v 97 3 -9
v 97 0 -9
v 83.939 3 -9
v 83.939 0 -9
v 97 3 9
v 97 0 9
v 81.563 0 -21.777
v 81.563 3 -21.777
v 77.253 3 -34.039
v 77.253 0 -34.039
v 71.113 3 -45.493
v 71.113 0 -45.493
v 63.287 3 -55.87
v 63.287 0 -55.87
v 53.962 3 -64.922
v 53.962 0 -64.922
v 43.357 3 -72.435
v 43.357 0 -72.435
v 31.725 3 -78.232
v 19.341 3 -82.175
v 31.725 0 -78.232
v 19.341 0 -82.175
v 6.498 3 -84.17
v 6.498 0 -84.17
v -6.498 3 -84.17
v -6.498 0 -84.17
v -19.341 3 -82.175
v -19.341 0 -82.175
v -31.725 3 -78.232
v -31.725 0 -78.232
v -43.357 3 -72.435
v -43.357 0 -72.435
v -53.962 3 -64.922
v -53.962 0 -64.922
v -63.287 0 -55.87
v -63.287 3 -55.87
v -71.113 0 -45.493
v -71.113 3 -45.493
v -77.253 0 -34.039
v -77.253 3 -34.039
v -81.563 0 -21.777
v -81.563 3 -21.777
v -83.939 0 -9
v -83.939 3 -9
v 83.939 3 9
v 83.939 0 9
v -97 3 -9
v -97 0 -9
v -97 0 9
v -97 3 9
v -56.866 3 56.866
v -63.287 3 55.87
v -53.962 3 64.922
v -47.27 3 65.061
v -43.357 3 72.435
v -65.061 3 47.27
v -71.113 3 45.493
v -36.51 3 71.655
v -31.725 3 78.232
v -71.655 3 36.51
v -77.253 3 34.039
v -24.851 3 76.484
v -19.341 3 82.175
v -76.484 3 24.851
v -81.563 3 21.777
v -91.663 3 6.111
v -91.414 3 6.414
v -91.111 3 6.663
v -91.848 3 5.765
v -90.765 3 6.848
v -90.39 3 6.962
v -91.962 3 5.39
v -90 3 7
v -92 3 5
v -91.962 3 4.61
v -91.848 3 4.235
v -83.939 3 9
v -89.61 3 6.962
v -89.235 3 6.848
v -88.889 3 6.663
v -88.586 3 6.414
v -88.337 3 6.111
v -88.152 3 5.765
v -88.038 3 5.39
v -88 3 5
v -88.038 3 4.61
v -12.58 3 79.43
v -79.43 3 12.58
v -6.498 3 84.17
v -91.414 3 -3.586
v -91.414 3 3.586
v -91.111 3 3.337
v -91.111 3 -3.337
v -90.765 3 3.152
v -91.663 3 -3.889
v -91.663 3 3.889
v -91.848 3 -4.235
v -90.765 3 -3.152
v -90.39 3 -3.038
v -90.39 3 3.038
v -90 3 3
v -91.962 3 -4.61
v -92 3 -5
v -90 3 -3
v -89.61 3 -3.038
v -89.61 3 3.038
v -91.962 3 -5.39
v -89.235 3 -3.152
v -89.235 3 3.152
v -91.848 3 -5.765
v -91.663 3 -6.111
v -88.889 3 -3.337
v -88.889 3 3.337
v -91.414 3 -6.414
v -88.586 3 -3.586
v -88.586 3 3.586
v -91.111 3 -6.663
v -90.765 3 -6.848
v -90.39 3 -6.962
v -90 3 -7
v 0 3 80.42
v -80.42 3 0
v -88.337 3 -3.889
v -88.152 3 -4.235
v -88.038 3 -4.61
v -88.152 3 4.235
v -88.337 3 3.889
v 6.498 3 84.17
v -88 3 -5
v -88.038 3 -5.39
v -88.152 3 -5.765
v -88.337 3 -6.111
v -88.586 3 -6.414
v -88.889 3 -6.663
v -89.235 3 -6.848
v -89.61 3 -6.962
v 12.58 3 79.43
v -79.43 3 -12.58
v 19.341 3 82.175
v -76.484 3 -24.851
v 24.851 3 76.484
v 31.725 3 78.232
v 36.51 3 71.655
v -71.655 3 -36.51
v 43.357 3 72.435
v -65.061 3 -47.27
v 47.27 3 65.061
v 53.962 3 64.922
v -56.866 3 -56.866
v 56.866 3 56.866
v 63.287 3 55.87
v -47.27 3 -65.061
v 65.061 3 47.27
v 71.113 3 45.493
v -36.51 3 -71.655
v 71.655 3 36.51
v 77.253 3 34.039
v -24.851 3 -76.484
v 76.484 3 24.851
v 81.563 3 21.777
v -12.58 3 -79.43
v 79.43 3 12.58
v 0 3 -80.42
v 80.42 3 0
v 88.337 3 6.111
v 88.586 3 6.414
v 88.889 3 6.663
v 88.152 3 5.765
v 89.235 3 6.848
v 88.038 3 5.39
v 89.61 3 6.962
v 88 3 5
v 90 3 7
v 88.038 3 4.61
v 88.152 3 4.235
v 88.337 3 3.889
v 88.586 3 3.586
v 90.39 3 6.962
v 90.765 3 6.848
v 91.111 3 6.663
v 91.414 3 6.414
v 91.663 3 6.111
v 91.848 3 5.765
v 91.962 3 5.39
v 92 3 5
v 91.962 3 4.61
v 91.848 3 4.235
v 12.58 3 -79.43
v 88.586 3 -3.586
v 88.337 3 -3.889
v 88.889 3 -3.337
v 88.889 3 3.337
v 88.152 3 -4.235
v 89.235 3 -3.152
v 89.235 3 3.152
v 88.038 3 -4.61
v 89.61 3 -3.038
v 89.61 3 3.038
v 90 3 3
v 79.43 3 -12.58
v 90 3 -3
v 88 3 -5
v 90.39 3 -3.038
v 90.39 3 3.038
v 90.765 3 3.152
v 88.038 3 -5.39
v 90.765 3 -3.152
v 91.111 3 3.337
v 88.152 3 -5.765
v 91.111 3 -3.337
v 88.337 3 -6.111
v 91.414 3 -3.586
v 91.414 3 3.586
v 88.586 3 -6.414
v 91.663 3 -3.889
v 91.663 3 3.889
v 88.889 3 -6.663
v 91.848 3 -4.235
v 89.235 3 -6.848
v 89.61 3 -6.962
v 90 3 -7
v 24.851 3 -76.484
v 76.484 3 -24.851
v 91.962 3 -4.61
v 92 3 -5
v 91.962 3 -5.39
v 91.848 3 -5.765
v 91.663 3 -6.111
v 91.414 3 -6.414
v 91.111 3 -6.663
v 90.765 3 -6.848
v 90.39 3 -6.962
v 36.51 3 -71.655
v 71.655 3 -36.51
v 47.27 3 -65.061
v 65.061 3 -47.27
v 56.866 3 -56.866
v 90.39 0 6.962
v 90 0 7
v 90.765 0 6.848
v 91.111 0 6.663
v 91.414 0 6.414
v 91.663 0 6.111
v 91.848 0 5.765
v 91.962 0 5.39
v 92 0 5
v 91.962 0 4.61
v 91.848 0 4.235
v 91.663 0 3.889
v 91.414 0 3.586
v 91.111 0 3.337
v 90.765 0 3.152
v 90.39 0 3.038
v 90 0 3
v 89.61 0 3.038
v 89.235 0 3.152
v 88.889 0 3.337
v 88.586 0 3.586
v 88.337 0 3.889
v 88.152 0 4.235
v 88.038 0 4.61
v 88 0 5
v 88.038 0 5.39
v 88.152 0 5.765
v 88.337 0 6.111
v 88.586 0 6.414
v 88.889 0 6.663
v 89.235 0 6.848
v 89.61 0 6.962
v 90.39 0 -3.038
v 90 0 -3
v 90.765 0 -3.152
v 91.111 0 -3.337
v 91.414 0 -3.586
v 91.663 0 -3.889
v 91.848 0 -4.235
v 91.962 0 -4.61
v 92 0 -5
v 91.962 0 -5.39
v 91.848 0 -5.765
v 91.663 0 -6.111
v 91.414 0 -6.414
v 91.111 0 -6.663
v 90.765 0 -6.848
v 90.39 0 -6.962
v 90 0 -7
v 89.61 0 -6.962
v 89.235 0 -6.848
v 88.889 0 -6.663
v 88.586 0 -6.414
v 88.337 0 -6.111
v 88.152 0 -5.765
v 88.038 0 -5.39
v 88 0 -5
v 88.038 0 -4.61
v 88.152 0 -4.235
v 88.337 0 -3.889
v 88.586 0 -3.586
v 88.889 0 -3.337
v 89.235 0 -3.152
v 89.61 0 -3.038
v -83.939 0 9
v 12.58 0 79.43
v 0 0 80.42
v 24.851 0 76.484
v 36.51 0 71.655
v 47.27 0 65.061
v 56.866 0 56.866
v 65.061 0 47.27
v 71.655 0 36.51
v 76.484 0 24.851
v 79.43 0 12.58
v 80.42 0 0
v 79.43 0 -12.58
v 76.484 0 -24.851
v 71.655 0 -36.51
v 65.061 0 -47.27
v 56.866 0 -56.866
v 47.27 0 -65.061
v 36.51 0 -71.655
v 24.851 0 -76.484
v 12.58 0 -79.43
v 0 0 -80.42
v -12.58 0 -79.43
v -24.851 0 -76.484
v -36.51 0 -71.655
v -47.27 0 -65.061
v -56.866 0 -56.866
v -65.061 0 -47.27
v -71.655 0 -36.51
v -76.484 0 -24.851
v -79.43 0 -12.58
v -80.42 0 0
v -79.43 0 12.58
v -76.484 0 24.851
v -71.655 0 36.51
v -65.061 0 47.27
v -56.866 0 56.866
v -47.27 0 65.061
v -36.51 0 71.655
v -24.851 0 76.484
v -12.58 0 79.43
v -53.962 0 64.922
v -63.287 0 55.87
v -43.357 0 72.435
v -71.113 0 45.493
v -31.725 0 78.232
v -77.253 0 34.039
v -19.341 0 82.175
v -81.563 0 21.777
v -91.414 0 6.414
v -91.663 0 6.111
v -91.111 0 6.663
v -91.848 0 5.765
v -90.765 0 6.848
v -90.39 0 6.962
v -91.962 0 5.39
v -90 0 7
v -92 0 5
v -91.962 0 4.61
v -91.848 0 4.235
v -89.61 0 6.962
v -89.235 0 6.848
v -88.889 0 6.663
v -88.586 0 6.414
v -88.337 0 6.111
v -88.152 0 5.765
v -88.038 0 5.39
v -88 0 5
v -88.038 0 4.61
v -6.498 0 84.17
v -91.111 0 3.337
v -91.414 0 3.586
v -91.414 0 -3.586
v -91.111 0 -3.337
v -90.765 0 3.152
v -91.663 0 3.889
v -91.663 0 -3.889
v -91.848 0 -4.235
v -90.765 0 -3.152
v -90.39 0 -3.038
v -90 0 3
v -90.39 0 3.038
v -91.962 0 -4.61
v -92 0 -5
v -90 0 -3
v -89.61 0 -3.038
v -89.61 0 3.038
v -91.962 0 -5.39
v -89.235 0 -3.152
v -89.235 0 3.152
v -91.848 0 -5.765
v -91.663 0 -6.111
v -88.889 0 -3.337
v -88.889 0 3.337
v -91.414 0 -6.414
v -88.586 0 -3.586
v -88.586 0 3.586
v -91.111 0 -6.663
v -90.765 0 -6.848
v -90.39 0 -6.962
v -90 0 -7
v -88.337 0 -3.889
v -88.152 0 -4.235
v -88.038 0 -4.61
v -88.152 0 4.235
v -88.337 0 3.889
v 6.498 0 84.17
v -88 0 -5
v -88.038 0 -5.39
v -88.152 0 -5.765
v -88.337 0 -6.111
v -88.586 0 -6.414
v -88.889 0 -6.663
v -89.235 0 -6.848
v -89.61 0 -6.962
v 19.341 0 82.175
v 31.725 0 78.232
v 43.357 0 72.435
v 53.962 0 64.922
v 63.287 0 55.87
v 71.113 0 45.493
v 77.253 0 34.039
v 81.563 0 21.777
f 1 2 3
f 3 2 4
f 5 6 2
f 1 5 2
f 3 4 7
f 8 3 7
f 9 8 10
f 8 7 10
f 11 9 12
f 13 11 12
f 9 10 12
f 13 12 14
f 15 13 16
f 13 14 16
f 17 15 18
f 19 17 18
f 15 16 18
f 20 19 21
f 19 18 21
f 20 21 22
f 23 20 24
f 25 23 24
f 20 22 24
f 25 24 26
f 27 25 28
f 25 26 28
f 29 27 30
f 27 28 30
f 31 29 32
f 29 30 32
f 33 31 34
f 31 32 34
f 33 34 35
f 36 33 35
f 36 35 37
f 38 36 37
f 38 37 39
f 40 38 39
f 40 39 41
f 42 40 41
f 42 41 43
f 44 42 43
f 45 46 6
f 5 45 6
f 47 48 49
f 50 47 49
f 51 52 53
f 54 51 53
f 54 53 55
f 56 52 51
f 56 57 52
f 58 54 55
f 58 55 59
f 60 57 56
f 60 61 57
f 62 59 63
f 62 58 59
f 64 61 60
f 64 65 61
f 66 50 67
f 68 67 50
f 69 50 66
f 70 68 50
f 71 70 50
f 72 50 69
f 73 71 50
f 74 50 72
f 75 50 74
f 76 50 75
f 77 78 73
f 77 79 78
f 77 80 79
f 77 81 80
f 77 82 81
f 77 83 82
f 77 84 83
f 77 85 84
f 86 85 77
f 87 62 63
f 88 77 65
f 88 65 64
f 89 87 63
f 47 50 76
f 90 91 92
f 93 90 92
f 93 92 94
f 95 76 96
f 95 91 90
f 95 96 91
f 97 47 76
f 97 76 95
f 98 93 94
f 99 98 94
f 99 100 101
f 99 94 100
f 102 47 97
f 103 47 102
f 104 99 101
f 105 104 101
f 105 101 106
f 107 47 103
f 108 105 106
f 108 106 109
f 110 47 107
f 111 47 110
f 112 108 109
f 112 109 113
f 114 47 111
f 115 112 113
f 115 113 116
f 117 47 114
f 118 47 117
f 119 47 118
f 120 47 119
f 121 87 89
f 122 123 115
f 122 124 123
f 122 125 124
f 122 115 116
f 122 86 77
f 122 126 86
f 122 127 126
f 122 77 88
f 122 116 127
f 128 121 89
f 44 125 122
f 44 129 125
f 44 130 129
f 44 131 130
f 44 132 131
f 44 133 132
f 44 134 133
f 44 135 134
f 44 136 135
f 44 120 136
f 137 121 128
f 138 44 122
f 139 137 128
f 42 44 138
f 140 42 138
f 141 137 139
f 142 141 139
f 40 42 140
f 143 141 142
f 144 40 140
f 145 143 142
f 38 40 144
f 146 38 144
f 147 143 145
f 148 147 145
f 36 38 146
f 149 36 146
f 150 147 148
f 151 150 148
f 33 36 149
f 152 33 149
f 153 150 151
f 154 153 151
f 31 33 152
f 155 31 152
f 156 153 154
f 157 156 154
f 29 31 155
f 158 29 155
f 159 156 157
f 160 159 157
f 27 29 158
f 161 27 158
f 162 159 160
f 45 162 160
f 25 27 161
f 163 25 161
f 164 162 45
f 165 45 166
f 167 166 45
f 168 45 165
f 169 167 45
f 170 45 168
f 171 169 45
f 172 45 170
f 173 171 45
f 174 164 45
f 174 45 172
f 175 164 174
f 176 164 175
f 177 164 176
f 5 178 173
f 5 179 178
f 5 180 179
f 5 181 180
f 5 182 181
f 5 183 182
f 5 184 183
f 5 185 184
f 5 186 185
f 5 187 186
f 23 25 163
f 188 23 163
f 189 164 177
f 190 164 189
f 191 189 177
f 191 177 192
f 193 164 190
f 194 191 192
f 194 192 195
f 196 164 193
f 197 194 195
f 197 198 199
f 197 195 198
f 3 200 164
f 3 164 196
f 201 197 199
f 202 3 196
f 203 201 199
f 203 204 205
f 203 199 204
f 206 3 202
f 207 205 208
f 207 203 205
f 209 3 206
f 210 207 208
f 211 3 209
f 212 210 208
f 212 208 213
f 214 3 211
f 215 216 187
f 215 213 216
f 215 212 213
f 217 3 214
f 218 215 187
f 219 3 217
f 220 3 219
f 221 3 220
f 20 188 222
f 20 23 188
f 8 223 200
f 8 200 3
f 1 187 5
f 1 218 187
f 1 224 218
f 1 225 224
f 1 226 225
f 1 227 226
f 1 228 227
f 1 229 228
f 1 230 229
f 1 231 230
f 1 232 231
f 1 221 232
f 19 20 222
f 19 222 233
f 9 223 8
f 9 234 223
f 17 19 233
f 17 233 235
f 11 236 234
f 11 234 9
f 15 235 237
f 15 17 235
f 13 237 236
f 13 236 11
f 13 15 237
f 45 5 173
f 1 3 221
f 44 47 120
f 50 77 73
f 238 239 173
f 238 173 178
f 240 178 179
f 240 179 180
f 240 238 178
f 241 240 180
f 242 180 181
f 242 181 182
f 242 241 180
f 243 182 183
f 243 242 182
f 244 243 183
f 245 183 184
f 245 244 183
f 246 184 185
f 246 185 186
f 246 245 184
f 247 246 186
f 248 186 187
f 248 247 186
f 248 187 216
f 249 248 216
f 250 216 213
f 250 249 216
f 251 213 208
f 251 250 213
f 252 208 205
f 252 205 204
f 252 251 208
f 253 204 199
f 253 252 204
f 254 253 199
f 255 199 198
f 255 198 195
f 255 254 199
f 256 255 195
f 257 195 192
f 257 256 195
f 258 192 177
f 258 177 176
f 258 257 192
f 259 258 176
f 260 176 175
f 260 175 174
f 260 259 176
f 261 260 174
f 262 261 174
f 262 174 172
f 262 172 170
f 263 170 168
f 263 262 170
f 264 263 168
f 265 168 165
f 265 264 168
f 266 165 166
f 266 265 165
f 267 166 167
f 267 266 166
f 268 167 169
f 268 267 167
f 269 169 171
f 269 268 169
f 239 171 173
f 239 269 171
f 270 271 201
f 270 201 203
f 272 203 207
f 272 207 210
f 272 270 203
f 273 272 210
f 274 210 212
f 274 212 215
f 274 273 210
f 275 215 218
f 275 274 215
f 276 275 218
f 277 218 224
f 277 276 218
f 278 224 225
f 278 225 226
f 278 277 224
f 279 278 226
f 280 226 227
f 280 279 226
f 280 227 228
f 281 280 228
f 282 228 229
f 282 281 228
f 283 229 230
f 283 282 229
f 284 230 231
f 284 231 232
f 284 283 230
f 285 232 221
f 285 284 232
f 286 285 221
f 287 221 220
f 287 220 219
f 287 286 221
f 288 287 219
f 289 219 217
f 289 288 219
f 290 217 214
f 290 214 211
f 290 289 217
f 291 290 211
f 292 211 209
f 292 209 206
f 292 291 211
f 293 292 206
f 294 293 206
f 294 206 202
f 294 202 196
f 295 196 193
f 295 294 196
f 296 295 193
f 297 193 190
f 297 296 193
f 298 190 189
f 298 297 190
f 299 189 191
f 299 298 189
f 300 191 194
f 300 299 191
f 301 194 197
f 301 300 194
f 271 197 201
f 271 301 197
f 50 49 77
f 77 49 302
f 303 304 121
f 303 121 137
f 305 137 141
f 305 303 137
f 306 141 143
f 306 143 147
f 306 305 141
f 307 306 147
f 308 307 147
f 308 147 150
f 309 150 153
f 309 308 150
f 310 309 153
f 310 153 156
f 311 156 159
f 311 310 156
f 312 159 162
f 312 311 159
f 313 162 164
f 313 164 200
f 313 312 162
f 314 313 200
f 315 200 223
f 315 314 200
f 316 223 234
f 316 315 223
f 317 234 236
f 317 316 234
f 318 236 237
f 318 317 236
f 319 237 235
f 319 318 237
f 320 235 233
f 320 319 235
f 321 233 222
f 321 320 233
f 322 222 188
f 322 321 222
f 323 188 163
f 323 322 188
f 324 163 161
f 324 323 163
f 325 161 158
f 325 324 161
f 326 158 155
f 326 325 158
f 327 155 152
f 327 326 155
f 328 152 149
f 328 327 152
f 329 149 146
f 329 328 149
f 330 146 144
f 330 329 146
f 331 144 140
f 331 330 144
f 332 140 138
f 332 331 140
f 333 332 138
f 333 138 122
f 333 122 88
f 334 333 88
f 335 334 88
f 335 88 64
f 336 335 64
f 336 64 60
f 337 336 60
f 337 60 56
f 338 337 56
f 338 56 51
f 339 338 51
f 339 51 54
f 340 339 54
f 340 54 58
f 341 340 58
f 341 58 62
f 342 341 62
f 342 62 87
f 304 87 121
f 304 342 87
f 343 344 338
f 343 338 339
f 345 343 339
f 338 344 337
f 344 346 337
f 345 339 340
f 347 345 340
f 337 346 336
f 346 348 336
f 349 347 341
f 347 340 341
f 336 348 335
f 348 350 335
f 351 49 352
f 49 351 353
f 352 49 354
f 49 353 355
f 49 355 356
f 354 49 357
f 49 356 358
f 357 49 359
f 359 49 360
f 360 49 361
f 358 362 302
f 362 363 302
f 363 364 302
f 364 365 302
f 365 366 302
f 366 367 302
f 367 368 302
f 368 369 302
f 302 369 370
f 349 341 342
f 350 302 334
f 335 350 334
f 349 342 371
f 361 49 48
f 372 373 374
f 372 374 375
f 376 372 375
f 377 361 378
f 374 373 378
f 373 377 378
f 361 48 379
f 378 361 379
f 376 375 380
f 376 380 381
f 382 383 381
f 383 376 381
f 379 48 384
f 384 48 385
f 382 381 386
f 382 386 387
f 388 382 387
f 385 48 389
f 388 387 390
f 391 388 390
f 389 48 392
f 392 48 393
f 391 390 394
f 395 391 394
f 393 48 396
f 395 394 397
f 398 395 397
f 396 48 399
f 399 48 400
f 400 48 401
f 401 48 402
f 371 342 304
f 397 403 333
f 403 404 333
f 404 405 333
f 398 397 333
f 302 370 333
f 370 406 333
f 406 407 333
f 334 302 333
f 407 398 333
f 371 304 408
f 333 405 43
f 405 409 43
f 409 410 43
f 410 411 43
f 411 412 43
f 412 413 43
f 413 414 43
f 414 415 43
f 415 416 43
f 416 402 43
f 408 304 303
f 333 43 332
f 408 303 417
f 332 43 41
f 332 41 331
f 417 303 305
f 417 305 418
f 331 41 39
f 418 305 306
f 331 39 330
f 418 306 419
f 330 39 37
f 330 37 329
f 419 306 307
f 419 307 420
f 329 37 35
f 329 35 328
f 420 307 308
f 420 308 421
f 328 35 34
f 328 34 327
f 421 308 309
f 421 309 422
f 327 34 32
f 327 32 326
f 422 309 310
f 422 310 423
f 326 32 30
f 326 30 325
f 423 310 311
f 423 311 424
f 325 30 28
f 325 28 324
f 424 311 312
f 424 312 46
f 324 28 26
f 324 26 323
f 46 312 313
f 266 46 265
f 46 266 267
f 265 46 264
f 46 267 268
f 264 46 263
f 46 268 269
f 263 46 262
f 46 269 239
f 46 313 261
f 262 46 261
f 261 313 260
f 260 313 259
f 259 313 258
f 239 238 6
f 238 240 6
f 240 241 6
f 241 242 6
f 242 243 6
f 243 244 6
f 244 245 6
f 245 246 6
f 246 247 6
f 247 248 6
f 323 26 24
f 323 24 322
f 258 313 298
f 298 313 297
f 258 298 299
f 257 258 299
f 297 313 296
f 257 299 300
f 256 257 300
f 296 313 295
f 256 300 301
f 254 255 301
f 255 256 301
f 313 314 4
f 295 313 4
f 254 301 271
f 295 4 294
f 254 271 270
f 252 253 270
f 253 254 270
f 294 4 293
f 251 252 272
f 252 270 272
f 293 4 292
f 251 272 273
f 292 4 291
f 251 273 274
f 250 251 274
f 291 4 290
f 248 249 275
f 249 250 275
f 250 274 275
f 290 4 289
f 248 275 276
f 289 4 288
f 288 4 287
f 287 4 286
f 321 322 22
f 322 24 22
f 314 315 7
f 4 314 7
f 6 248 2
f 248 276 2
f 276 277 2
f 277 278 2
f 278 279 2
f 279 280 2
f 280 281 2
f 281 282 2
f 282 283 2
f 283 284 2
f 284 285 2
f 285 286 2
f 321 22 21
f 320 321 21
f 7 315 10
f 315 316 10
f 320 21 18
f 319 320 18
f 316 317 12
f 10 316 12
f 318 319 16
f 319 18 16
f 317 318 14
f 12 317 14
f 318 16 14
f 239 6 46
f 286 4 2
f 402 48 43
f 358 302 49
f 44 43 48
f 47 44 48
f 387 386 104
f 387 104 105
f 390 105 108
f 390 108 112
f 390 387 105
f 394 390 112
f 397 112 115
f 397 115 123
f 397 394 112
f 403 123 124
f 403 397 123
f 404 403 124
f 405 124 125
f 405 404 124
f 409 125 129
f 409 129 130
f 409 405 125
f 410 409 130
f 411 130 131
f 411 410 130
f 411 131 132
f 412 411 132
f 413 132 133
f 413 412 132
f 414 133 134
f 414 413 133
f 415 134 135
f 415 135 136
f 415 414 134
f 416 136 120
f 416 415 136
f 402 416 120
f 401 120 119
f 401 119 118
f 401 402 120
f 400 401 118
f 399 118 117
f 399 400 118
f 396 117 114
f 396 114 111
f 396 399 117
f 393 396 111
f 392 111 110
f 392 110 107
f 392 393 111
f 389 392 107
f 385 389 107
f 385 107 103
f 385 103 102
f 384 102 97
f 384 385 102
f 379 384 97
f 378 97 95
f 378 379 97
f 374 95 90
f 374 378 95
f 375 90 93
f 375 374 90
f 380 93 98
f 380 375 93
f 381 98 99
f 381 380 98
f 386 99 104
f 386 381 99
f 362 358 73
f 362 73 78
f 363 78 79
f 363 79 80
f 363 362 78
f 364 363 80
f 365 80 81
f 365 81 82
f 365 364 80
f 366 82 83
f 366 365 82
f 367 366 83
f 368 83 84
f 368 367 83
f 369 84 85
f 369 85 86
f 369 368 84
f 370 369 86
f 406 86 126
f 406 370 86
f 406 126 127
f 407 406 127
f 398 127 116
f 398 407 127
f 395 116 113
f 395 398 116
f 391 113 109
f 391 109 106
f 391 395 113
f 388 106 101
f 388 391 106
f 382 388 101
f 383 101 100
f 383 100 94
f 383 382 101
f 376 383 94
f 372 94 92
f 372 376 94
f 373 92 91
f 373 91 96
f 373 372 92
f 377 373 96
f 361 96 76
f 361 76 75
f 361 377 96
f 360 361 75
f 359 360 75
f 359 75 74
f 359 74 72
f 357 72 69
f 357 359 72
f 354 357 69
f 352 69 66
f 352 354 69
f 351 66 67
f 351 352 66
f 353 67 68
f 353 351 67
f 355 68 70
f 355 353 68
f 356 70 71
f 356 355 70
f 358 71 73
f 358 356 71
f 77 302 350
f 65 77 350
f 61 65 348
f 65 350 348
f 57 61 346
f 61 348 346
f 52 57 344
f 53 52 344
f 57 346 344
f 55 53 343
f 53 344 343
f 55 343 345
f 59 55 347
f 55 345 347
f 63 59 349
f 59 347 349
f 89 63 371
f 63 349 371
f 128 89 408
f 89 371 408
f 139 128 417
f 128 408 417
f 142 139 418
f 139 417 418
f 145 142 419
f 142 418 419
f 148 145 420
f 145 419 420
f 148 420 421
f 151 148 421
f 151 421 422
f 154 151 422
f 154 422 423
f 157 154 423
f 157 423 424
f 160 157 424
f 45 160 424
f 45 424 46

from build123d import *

# Parameters (mm, degrees)
CROQUIS1_R              = 2
CROQUIS1_R_2            = 84.42
CROQUIS1_R_3            = 80.42
SALIENTE_EXTRUIR1_DEPTH = 3


with BuildPart() as part:
    # Croquis1 → Saliente-Extruir1 (new body)
    # profile 1 of 3: a face of its own
    with BuildSketch(Plane(origin=(0, 0, 0), x_dir=(1, 0, 0), z_dir=(0, 1, 0))):
        with BuildLine():
            Line((83.93888491, -9), (97, -9))
            Line((97, -9), (97, 9))
            Line((97, 9), (83.93888491, 9))
            ThreePointArc((83.93888491, 9), (84.299635421, 4.506425183), (84.42, 0))
            ThreePointArc((84.42, 0), (84.299635421, -4.506425183), (83.93888491, -9))
        make_face()
        with Locations(Location((90, -5, 0), (0, 0, 270))):
            Circle(CROQUIS1_R, mode=Mode.SUBTRACT)
        with Locations(Location((90, 5, 0), (0, 0, 270))):
            Circle(CROQUIS1_R, mode=Mode.SUBTRACT)
    # profile 2 of 3: a face of its own
    with BuildSketch(Plane(origin=(0, 0, 0), x_dir=(1, 0, 0), z_dir=(0, 1, 0))):
        Circle(CROQUIS1_R_2)
        with Locations(Location((0, 0, 0), (0, 0, 270))):
            Circle(CROQUIS1_R_3, mode=Mode.SUBTRACT)
    # profile 3 of 3: a face of its own
    with BuildSketch(Plane(origin=(0, 0, 0), x_dir=(1, 0, 0), z_dir=(0, 1, 0))):
        with BuildLine():
            Line((-97, -9), (-83.93888491, -9))
            ThreePointArc((-83.93888491, -9), (-84.42, 0), (-83.93888491, 9))
            Line((-83.93888491, 9), (-97, 9))
            Line((-97, 9), (-97, -9))
        make_face()
        with Locations(Location((-90, -5, 0), (0, 0, 270))):
            Circle(CROQUIS1_R, mode=Mode.SUBTRACT)
        with Locations(Location((-90, 5, 0), (0, 0, 270))):
            Circle(CROQUIS1_R, mode=Mode.SUBTRACT)
    extrude(amount=SALIENTE_EXTRUIR1_DEPTH)


solid = part.part
